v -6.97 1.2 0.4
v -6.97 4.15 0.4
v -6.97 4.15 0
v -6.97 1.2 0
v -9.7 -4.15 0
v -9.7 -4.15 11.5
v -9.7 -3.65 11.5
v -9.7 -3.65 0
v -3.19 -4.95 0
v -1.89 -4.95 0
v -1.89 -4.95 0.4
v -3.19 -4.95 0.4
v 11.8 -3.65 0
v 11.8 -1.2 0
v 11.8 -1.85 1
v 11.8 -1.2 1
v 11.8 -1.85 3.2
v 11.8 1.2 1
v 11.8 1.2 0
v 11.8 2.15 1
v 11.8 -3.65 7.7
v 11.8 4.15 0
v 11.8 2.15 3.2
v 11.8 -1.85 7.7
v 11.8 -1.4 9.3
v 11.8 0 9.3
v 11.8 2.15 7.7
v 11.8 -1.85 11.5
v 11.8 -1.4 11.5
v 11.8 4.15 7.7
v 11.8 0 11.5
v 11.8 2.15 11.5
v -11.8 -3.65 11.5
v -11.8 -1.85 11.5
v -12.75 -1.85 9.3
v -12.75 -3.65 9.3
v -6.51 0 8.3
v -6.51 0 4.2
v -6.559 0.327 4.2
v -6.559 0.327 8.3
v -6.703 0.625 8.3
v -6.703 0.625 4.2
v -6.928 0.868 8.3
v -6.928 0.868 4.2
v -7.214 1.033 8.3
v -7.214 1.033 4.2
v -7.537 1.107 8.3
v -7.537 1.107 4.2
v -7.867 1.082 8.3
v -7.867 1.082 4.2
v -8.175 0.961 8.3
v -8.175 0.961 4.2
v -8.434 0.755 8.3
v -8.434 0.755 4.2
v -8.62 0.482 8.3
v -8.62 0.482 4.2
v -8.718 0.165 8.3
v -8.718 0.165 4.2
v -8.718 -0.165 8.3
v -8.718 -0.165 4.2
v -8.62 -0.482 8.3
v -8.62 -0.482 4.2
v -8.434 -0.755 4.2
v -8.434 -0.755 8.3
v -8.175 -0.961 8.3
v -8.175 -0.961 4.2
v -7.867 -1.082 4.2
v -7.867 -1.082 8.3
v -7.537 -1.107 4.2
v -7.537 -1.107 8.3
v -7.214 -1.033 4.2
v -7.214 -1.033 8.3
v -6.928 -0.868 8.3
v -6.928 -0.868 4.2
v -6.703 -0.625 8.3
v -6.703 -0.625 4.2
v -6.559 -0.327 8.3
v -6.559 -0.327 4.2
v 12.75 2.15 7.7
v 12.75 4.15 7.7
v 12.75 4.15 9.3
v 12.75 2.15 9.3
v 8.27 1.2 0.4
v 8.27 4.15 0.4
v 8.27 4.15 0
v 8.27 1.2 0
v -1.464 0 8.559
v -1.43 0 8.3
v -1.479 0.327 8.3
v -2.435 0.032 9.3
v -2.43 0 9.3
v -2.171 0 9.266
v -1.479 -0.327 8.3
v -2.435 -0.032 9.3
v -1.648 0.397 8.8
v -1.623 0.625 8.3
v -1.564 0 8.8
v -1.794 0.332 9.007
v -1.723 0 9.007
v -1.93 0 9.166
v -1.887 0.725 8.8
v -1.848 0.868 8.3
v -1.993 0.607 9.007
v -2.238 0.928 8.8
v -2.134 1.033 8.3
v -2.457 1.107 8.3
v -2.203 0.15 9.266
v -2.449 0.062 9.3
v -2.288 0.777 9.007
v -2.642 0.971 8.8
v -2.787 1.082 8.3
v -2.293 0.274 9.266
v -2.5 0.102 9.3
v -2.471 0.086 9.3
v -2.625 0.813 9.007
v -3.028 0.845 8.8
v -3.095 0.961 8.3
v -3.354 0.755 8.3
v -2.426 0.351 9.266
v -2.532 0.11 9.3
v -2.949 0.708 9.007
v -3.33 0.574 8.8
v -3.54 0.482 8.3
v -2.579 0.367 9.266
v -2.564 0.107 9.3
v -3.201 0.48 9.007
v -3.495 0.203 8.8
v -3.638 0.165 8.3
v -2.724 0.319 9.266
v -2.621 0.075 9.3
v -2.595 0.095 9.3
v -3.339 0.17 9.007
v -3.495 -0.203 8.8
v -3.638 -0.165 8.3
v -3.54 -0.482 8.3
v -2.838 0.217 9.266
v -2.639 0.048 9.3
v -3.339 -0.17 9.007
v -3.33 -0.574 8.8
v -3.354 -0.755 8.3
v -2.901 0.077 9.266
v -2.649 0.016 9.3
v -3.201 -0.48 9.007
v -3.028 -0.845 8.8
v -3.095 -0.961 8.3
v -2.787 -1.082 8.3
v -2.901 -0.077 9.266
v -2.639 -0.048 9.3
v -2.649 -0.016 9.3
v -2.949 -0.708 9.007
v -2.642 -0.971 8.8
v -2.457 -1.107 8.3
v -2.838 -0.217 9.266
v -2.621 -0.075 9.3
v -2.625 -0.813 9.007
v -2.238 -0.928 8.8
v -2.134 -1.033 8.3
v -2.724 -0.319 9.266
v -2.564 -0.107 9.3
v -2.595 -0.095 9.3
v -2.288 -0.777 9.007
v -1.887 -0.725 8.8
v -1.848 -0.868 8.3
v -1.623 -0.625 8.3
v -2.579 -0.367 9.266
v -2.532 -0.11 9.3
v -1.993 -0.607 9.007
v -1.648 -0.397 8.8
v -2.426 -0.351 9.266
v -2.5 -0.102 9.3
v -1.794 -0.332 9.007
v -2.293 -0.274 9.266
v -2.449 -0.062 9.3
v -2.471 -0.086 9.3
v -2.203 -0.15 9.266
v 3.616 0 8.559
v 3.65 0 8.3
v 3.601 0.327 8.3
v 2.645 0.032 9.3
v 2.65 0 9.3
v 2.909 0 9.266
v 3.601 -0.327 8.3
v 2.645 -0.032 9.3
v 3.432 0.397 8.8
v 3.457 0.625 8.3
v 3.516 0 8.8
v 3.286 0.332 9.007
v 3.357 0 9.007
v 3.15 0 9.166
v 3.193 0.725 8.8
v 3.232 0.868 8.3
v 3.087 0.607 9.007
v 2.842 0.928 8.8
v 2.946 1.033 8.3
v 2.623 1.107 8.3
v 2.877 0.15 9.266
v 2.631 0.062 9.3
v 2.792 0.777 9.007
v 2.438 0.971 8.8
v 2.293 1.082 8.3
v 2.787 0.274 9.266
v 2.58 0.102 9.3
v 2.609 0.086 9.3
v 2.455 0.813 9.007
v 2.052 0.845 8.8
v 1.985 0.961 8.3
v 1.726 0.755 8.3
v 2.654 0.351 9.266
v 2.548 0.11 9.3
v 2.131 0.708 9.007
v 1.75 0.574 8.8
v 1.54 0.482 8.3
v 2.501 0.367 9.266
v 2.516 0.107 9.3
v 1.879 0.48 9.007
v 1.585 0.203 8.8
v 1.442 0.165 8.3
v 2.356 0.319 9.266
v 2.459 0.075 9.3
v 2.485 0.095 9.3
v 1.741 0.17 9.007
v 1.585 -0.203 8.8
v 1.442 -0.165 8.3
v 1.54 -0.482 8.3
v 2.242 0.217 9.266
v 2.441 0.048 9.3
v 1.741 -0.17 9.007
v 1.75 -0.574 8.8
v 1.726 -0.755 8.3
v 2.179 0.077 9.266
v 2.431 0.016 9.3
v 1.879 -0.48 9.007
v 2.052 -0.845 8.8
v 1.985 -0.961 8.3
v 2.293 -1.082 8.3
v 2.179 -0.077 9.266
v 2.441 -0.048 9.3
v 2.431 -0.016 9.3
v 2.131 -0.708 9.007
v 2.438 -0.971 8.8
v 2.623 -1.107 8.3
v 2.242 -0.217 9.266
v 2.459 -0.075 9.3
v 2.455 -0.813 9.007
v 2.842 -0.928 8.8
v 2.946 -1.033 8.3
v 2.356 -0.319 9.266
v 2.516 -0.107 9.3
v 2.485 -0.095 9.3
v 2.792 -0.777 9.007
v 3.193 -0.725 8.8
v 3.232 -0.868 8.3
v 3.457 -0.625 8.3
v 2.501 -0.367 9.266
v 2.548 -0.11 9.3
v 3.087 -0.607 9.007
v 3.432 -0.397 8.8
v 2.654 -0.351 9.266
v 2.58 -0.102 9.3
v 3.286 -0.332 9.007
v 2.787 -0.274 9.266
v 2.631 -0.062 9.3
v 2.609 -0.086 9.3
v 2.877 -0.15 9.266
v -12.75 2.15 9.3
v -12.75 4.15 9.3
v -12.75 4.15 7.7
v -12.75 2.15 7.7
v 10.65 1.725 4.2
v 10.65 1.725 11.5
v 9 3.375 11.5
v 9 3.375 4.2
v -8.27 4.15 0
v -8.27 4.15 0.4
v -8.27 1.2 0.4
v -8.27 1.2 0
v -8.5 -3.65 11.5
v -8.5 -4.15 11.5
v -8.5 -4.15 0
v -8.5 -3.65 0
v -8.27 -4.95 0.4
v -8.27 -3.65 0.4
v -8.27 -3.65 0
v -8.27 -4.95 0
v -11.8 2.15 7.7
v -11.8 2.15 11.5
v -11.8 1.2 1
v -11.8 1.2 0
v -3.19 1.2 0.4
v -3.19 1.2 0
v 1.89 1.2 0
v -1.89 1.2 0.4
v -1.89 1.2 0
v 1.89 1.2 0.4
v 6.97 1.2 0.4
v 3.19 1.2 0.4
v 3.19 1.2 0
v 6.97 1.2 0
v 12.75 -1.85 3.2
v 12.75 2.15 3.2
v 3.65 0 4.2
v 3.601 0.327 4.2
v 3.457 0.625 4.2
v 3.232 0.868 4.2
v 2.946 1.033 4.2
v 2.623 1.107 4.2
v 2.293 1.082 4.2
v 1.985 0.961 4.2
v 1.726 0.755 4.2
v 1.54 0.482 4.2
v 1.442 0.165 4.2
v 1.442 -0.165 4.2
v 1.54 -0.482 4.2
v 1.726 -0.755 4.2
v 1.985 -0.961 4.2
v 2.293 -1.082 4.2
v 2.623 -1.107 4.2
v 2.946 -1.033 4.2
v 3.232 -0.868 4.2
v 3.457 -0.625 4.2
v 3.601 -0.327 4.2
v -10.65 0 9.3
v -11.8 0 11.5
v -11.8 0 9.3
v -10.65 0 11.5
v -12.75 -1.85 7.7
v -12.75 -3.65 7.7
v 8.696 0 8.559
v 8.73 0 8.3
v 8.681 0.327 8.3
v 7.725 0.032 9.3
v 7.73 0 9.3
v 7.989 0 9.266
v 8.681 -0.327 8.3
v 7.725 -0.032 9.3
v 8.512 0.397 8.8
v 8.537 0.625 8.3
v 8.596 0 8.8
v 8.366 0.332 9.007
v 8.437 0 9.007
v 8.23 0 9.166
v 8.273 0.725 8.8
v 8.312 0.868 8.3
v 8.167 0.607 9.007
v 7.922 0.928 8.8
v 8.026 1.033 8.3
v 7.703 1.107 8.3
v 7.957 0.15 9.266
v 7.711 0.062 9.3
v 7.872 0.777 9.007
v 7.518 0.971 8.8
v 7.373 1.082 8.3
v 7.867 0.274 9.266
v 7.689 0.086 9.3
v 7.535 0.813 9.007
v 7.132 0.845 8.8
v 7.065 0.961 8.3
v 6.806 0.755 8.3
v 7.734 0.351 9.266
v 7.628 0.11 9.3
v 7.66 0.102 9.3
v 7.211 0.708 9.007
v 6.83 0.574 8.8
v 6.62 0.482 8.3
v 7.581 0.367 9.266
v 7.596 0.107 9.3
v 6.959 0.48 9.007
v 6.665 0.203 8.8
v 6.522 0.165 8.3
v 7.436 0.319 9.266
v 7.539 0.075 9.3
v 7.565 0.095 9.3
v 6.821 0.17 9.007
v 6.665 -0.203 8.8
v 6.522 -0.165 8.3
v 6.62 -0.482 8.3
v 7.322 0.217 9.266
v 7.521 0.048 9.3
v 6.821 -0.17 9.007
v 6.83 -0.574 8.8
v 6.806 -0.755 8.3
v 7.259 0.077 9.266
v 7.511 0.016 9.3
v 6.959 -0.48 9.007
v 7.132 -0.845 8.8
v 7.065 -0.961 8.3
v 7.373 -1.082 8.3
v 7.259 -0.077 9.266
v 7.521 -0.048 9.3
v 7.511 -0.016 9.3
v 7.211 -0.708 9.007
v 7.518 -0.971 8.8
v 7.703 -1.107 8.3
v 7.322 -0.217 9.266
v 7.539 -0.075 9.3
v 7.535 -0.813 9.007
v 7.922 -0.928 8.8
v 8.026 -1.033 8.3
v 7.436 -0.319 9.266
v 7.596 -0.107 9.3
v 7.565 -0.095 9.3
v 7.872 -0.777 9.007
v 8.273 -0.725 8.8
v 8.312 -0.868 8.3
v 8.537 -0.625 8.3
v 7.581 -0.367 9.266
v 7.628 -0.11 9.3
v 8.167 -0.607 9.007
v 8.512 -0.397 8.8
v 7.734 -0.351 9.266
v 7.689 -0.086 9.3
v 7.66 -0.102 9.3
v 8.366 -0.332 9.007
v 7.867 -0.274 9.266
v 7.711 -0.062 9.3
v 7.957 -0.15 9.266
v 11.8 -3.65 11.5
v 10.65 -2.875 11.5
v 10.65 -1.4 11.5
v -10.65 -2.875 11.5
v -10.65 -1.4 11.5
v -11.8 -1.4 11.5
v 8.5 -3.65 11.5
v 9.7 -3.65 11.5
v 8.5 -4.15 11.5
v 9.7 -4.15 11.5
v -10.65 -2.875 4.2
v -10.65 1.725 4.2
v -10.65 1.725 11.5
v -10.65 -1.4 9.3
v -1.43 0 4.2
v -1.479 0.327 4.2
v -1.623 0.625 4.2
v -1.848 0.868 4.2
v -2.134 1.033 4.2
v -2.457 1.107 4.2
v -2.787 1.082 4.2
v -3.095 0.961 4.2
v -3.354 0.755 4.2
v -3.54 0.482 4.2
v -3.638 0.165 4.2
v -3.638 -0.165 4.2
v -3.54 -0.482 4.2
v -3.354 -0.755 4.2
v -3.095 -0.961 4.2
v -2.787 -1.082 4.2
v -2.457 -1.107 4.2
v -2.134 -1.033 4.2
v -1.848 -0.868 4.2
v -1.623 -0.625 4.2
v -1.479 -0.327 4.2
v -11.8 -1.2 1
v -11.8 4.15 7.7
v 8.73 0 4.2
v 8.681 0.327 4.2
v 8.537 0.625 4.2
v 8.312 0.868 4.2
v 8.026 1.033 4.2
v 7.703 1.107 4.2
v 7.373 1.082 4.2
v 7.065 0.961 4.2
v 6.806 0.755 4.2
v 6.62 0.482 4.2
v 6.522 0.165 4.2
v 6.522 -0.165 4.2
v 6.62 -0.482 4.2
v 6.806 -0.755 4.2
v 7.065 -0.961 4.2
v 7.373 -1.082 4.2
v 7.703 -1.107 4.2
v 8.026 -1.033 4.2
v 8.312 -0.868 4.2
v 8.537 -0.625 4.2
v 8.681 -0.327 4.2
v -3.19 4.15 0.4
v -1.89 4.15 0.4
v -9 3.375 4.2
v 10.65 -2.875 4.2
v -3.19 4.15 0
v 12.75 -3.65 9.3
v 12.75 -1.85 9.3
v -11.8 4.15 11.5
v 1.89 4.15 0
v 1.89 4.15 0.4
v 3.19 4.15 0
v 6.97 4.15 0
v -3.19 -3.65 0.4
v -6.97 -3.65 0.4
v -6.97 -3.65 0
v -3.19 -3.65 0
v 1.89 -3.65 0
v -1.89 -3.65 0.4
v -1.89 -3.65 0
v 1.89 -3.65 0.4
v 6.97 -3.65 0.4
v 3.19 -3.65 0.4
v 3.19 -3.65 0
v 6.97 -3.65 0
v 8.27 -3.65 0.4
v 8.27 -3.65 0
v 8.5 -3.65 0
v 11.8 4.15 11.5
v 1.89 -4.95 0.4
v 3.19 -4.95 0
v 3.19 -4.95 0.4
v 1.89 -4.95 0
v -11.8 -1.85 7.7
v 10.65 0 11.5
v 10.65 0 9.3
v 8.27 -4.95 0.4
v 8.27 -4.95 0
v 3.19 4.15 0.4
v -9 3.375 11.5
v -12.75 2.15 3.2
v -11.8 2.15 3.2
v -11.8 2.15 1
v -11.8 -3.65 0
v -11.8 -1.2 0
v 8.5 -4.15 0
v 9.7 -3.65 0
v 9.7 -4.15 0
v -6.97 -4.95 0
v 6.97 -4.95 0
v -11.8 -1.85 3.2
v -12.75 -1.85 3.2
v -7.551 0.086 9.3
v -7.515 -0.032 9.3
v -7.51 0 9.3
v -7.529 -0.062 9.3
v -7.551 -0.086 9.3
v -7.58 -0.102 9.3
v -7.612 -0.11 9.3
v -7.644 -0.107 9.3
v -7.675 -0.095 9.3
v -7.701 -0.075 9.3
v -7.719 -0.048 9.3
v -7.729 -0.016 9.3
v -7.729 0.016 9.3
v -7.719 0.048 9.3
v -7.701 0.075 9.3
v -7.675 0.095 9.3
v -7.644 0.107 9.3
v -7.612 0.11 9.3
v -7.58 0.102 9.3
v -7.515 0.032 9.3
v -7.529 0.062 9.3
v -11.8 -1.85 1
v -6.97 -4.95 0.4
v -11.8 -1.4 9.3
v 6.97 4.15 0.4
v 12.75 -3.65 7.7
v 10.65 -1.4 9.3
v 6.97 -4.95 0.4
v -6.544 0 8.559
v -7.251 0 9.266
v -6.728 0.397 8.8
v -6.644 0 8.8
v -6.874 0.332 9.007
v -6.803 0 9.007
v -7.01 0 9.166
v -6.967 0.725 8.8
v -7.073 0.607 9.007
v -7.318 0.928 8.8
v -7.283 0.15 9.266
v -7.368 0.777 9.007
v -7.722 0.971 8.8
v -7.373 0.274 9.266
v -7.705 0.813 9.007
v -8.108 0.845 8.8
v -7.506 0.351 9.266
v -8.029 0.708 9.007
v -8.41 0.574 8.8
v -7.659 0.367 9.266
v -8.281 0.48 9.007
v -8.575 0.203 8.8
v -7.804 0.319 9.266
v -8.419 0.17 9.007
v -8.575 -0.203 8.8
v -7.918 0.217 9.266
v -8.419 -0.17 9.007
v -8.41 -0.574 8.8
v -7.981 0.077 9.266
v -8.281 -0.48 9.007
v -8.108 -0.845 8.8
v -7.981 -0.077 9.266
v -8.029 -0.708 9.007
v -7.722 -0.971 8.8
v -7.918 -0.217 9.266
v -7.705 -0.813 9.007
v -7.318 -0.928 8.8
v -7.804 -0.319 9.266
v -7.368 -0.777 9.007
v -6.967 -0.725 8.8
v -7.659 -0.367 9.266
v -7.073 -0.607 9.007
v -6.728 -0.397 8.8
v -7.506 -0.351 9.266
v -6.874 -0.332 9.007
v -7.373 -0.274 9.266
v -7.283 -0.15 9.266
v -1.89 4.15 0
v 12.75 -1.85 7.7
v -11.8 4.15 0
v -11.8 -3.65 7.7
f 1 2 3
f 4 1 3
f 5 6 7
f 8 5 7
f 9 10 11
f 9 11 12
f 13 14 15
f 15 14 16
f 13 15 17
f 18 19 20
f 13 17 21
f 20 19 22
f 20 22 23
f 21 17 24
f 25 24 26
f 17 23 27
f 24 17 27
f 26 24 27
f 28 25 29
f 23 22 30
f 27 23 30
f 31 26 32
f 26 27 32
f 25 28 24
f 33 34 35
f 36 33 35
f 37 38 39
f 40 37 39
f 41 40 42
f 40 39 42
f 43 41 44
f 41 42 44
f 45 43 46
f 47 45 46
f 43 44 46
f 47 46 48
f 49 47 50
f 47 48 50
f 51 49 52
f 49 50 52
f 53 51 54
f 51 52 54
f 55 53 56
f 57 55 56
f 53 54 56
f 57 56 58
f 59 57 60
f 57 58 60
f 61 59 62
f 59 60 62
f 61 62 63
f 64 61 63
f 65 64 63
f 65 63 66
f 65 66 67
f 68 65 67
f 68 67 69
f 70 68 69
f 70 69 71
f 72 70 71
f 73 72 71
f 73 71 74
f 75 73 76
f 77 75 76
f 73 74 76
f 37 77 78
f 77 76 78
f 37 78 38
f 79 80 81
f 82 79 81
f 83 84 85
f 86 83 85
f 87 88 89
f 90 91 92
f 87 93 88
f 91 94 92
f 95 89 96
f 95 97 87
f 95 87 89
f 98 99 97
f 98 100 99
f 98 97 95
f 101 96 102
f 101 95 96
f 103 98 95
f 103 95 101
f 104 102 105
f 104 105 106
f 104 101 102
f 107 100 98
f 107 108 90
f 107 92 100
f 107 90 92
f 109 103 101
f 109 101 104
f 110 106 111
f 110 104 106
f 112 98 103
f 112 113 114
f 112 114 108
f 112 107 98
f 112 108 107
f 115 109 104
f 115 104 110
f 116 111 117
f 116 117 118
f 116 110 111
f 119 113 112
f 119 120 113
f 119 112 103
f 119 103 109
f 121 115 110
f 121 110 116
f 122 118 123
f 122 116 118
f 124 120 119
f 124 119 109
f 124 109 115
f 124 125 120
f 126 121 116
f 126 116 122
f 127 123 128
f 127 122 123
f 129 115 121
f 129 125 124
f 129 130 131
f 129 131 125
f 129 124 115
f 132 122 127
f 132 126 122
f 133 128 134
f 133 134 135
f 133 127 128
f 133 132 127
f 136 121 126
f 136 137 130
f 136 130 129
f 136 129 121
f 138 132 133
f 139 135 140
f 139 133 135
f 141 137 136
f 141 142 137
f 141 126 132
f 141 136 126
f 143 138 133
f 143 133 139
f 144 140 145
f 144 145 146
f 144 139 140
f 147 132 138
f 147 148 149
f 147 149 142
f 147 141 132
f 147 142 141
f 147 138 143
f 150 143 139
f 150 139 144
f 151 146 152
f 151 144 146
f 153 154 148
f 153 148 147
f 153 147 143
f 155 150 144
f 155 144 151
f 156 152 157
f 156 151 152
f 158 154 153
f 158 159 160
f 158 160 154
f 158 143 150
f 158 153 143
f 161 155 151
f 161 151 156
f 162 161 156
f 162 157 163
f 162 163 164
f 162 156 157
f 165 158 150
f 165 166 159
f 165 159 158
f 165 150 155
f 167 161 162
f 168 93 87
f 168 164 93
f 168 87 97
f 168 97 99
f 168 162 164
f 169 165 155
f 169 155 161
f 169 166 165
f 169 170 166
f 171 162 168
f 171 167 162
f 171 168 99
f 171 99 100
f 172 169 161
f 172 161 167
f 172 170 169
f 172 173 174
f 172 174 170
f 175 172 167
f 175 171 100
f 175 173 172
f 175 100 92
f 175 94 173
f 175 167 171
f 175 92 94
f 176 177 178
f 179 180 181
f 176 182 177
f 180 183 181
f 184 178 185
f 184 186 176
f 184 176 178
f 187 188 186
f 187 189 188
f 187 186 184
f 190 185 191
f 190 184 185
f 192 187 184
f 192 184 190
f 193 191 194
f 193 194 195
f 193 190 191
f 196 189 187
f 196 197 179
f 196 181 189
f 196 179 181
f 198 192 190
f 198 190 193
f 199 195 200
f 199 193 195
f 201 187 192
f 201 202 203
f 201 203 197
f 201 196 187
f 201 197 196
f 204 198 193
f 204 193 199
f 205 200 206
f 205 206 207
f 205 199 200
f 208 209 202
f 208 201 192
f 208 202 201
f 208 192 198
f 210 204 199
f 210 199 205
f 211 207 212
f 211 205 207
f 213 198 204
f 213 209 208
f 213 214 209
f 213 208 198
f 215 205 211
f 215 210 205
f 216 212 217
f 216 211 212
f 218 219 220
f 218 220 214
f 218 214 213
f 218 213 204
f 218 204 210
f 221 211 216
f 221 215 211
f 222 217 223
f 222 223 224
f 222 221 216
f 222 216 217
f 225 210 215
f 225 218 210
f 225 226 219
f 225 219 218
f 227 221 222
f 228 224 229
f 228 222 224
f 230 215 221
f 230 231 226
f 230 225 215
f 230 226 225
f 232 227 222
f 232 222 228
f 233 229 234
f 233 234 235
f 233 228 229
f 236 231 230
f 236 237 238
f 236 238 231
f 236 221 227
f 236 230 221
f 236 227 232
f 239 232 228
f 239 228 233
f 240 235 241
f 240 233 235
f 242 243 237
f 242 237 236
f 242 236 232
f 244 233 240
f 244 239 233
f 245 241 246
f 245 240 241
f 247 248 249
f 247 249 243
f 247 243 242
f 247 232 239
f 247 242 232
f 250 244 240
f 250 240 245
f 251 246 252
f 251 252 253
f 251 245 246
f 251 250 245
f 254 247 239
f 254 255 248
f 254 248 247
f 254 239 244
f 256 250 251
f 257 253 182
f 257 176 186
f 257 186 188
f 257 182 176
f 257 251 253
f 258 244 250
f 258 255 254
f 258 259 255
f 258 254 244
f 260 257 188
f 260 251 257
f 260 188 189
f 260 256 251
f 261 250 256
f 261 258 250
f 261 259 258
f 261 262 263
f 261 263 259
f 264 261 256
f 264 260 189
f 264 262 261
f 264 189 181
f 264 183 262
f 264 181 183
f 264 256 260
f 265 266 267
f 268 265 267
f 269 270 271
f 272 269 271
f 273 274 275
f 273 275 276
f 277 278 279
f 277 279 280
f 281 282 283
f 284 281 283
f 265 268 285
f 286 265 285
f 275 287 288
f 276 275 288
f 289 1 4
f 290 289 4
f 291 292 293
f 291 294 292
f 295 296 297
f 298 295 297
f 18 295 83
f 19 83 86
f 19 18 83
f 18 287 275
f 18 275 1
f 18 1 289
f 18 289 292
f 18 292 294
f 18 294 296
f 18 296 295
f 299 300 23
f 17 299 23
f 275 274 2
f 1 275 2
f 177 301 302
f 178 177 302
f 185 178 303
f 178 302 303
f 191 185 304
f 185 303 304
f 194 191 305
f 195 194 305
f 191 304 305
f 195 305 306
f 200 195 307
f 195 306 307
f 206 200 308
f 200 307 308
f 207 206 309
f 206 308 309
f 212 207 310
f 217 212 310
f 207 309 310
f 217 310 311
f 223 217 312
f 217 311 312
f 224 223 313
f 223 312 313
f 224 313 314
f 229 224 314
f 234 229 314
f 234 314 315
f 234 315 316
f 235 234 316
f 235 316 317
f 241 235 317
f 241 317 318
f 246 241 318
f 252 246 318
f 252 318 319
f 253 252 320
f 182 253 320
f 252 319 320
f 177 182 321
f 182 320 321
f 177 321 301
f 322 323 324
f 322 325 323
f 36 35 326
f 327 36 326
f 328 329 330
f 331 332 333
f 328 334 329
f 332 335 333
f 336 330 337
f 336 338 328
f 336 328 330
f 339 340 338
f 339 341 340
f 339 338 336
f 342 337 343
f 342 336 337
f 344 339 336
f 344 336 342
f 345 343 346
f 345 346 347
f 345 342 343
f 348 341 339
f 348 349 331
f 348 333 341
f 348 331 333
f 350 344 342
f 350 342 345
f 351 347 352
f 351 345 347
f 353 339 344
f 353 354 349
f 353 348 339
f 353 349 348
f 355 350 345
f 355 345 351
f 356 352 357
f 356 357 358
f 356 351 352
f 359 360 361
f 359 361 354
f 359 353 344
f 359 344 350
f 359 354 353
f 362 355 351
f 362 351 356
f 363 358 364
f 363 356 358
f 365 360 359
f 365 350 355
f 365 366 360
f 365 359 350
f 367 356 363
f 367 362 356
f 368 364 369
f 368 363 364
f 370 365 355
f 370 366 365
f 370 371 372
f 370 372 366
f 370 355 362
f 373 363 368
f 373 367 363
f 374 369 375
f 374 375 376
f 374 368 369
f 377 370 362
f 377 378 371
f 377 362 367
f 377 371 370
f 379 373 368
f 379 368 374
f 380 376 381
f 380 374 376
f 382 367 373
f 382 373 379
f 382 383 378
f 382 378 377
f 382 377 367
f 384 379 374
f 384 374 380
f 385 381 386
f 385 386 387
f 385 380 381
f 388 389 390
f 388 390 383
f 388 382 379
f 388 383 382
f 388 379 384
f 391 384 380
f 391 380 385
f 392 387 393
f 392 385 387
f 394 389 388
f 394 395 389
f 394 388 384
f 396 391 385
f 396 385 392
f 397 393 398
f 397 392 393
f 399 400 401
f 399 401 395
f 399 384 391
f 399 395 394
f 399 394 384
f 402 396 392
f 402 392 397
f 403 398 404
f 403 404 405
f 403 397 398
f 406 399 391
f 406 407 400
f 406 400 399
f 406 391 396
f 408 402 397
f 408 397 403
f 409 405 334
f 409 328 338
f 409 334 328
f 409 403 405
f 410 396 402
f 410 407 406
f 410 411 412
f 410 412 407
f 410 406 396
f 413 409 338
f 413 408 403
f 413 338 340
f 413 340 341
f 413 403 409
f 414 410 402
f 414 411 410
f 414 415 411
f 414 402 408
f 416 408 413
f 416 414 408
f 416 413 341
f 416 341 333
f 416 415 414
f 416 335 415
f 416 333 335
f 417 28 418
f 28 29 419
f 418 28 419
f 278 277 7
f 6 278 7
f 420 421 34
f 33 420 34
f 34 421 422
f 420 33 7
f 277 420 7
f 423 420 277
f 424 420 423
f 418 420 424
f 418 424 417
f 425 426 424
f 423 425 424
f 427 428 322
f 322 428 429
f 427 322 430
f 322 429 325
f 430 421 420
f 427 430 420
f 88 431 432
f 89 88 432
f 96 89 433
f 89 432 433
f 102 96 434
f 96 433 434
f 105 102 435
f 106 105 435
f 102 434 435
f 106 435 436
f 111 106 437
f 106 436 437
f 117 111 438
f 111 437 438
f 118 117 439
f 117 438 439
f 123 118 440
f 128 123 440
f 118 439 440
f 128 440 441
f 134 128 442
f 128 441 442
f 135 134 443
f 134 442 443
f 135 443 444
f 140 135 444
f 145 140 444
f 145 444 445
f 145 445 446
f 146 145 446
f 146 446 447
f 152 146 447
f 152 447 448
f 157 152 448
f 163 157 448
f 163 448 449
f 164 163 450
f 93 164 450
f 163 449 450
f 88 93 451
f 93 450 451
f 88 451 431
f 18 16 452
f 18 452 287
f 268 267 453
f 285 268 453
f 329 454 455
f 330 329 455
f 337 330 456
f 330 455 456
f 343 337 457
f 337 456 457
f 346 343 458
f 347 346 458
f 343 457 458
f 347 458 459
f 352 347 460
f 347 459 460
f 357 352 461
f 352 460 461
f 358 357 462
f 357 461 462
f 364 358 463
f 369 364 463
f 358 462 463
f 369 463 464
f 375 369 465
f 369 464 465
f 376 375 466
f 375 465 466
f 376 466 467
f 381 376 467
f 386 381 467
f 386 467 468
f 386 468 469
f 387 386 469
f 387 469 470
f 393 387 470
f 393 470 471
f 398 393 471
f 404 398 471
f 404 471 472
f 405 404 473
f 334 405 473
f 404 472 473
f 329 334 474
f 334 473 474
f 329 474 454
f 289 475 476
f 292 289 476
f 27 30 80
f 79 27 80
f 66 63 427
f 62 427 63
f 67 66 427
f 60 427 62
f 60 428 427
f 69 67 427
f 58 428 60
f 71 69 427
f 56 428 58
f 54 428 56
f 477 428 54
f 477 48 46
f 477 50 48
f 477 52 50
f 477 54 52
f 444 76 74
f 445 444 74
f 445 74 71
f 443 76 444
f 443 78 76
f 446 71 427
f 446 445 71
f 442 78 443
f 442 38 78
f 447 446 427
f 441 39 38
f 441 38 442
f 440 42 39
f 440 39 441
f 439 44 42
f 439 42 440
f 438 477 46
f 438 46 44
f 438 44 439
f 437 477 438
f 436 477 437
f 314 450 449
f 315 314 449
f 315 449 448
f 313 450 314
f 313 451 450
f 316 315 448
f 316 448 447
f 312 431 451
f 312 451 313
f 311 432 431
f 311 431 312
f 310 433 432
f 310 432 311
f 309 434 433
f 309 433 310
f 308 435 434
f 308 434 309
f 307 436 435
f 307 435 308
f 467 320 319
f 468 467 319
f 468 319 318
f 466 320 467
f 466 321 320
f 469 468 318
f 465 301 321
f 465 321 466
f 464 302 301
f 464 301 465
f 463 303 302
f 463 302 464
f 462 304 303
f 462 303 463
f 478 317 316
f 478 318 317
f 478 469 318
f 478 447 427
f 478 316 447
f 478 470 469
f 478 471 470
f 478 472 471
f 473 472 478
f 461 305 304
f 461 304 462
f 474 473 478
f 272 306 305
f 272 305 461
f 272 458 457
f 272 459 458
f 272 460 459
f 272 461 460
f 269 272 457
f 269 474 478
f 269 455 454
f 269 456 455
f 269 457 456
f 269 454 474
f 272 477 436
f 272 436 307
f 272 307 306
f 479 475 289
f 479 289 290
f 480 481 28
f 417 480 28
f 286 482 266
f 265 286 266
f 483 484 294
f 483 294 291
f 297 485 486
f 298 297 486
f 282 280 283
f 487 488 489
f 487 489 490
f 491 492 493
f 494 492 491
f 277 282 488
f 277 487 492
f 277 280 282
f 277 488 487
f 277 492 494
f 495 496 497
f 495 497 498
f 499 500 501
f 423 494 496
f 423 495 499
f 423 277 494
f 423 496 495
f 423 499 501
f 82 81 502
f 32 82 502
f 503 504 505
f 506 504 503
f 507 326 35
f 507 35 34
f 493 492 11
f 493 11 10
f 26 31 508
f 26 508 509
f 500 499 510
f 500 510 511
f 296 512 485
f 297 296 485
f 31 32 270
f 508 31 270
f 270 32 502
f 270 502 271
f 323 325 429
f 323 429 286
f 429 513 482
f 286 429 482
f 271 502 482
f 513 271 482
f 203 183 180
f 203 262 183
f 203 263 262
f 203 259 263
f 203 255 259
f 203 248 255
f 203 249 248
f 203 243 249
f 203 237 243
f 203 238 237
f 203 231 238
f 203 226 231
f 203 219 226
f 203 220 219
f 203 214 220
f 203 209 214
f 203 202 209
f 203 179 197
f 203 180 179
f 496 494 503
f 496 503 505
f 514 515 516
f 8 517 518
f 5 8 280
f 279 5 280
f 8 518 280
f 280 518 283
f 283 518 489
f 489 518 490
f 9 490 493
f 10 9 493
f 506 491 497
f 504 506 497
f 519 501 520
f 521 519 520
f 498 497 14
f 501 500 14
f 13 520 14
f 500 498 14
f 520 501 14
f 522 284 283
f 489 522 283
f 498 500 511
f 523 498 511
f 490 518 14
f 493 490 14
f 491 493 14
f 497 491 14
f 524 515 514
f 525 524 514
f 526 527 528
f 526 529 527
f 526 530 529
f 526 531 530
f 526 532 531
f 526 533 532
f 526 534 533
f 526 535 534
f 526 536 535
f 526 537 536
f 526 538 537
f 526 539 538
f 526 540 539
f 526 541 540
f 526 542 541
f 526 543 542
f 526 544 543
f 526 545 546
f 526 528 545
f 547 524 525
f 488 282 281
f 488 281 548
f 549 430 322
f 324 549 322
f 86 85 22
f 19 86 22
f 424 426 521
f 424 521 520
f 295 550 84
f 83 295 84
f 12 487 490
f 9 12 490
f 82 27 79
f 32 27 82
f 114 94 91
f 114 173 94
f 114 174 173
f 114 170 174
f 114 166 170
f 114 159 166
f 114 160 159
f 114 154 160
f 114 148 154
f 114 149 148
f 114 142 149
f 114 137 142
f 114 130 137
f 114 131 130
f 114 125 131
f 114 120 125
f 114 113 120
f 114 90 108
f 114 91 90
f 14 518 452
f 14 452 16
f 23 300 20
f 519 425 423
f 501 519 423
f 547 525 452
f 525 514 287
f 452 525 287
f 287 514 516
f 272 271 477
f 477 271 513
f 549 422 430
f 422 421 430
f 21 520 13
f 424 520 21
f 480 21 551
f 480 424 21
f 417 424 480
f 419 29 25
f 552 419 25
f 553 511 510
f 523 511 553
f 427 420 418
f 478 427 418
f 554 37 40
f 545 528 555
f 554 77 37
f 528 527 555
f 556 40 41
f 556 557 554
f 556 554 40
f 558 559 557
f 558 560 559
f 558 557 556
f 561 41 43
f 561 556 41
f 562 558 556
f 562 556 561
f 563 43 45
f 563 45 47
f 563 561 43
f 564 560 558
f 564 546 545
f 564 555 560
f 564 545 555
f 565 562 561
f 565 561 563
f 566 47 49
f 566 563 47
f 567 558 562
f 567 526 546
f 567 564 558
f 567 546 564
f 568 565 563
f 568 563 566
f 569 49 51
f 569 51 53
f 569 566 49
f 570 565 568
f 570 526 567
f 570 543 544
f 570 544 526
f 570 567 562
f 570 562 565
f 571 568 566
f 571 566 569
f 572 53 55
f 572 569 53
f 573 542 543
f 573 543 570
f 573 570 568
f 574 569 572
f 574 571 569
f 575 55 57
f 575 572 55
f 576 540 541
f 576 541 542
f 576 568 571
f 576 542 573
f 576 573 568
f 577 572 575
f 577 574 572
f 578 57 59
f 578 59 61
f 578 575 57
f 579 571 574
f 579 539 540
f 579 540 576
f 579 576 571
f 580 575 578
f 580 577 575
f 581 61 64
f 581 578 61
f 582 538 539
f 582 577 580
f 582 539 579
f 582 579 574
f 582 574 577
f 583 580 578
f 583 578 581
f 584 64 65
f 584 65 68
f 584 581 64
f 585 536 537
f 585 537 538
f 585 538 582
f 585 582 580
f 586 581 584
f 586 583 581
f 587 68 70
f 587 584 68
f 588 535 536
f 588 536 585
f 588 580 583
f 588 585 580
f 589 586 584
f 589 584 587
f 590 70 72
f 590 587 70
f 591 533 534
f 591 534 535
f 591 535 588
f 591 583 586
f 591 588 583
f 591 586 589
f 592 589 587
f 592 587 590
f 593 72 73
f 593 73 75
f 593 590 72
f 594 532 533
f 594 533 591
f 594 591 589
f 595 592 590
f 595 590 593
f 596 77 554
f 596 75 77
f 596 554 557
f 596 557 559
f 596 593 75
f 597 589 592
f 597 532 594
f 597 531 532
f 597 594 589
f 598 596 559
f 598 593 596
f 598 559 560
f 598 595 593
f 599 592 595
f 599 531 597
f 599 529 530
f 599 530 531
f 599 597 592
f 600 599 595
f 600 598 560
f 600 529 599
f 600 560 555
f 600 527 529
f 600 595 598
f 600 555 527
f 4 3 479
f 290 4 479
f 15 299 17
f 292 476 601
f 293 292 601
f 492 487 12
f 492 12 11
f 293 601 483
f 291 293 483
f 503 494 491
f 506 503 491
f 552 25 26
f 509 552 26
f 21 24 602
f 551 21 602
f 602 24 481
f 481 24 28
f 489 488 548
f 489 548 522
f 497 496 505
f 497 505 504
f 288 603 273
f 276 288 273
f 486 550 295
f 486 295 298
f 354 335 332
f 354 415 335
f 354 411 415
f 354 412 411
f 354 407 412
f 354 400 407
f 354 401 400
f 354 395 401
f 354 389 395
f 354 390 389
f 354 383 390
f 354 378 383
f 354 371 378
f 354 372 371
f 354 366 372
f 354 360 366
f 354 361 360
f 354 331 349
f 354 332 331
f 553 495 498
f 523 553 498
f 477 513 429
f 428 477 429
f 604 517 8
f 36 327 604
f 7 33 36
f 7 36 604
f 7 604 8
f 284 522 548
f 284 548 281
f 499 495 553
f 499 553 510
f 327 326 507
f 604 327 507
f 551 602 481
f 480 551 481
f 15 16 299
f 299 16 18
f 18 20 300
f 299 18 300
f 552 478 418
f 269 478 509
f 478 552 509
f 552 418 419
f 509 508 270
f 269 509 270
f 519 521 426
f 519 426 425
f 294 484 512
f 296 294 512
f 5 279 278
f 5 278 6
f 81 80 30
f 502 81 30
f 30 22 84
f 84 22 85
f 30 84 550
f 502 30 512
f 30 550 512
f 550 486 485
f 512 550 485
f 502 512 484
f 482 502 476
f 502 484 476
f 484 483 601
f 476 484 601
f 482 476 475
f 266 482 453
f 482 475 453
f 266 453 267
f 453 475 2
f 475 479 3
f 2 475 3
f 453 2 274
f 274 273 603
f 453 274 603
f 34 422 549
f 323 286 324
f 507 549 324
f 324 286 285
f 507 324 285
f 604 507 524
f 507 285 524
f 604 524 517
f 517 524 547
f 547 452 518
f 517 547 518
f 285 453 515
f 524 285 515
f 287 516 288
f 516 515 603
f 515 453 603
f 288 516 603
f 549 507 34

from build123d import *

# Parameters (mm, degrees)
BOSS_EXTRUDE1_DEPTH = 4.15
SKETCH2_W           = 10
SKETCH2_H           = 5
SKETCH2_W_2         = 17
CUT_EXTRUDE1_DEPTH  = 12.5
SKETCH3_W           = 5
SKETCH3_H           = 4
CUT_EXTRUDE2_DEPTH  = 6.3
SKETCH4_W           = 5
SKETCH4_H           = 4.540427611
SKETCH4_H_2         = 5
CUT_EXTRUDE3_DEPTH  = 6.3
CUT_EXTRUDE4_DEPTH  = 7.3
SKETCH6_R           = 1.11
BOSS_EXTRUDE2_DEPTH = 5.1
FILLET1_R           = 1
SKETCH7_W           = 5
SKETCH7_H           = 1.4
CUT_EXTRUDE5_DEPTH  = 25.55
SKETCH8_W           = 1.3
SKETCH8_H           = 3
CUT_EXTRUDE6_DEPTH  = 9.3
SKETCH9_W           = 3
SKETCH9_H           = 2.4
CUT_EXTRUDE7_DEPTH  = 25.55
SKETCH10_W          = 1.3
SKETCH10_H          = 0.4
BOSS_EXTRUDE3_DEPTH = 6.5
SKETCH11_W          = 20
SKETCH11_H          = 5
CUT_EXTRUDE8_DEPTH  = 12.5


with BuildPart() as part:
    # Sketch1 → Boss-Extrude1 (new body, symmetric)
    with BuildSketch(Plane(origin=(0, 0, 0), x_dir=(1, 0, 0), z_dir=(0, 1, 0))):
        Polygon((-11.8, 0), (11.8, 0), (11.8, -1), (12.75, -3.2), (11.8, -3.2), (11.8, -7.7), (12.75, -7.7), (12.75, -9.3), (11.8, -11.5), (-11.8, -11.5), (-12.75, -9.3), (-12.75, -7.7), (-11.8, -7.7), (-11.8, -3.2), (-12.75, -3.2), (-11.8, -1), align=None)
    extrude(amount=BOSS_EXTRUDE1_DEPTH, both=True)

    # Sketch2 → Cut-Extrude1 (cut, through all)
    with BuildSketch(Plane.XY.offset(11.5)):
        with Locations((14.7, -6.15)):
            Rectangle(SKETCH2_W, SKETCH2_H)
        with Locations((-14.7, -6.15)):
            Rectangle(SKETCH2_W, SKETCH2_H)
        with Locations((0, -6.15)):
            Rectangle(SKETCH2_W_2, SKETCH2_H)
    extrude(amount=-CUT_EXTRUDE1_DEPTH, mode=Mode.SUBTRACT)

    # Sketch3 → Cut-Extrude2 (cut)
    with BuildSketch(Plane.XY.offset(11.5)):
        with Locations((14.3, 0.15)):
            Rectangle(SKETCH3_W, SKETCH3_H)
        with Locations((-14.3, 0.15)):
            Rectangle(SKETCH3_W, SKETCH3_H)
    extrude(amount=-CUT_EXTRUDE2_DEPTH, mode=Mode.SUBTRACT)

    # Sketch4 → Cut-Extrude3 (cut)
    with BuildSketch(Plane(origin=(0, 0, 0), x_dir=(-1, 0, 0), z_dir=(0, 0, -1))):
        with Locations((14.3, 4.420213806)):
            Rectangle(SKETCH4_W, SKETCH4_H)
        with Locations((14.3, -4.35)):
            Rectangle(SKETCH4_W, SKETCH4_H_2)
        with Locations((-14.3, -4.35)):
            Rectangle(SKETCH4_W, SKETCH4_H_2)
        with Locations((-14.3, 4.65)):
            Rectangle(SKETCH4_W, SKETCH4_H_2)
    extrude(amount=-CUT_EXTRUDE3_DEPTH, mode=Mode.SUBTRACT)

    # Sketch5 → Cut-Extrude4 (cut)
    with BuildSketch(Plane.XY.offset(11.5)):
        Polygon((-10.65, -2.875), (10.65, -2.875), (10.65, 1.725), (9, 3.375), (-9, 3.375), (-10.65, 1.725), align=None)
    extrude(amount=-CUT_EXTRUDE4_DEPTH, mode=Mode.SUBTRACT)

    # Sketch6 → Boss-Extrude2 (add)
    with BuildSketch(Plane.XY.offset(4.2)):
        with Locations((-7.62, 0)):
            Circle(SKETCH6_R)
        with Locations((-2.54, 0)):
            Circle(SKETCH6_R)
        with Locations((2.54, -3.41e-07)):
            Circle(SKETCH6_R)
        with Locations((7.62, 0)):
            Circle(SKETCH6_R)
    extrude(amount=BOSS_EXTRUDE2_DEPTH)

    # Fillet1
    fillet1_edges = [part.edges().sort_by_distance(p)[0] for p in [
        (-8.73, 0, 9.3),
        (-3.65, 0, 9.3),
        (1.43, -3.41e-07, 9.3),
        (6.51, 0, 9.3),
    ]]
    fillet(fillet1_edges, radius=FILLET1_R)

    # Sketch7 → Cut-Extrude5 (cut, through all)
    with BuildSketch(Plane(origin=(11.8, 0, 0), x_dir=(0, 0, -1), z_dir=(1, 0, 0))):
        with Locations((-11.8, -0.7)):
            Rectangle(SKETCH7_W, SKETCH7_H)
    extrude(amount=-CUT_EXTRUDE5_DEPTH, mode=Mode.SUBTRACT)

    # Sketch8 → Cut-Extrude6 (cut, through all)
    with BuildSketch(Plane(origin=(0, 4.15, 0), x_dir=(1, 0, 0), z_dir=(0, 1, 0))):
        with Locations((-7.62, 1.1)):
            Rectangle(SKETCH8_W, SKETCH8_H)
        with Locations((-2.54, 1.1)):
            Rectangle(SKETCH8_W, SKETCH8_H)
        with Locations((2.54, 1.1)):
            Rectangle(SKETCH8_W, SKETCH8_H)
        with Locations((7.62, 1.1)):
            Rectangle(SKETCH8_W, SKETCH8_H)
    extrude(amount=-CUT_EXTRUDE6_DEPTH, mode=Mode.SUBTRACT)

    # Sketch9 → Cut-Extrude7 (cut, through all)
    with BuildSketch(Plane(origin=(11.8, 0, 0), x_dir=(0, 0, -1), z_dir=(1, 0, 0))):
        with Locations((0.5, 0)):
            Rectangle(SKETCH9_W, SKETCH9_H)
    extrude(amount=-CUT_EXTRUDE7_DEPTH, mode=Mode.SUBTRACT)

    # Sketch10 → Boss-Extrude3 (add)
    with BuildSketch(Plane(origin=(0, -1.2, 0), x_dir=(1, 0, 0), z_dir=(0, 1, 0))):
        with Locations((-7.62, -0.2)):
            Rectangle(SKETCH10_W, SKETCH10_H)
        with Locations((-2.54, -0.2)):
            Rectangle(SKETCH10_W, SKETCH10_H)
        with Locations((2.54, -0.2)):
            Rectangle(SKETCH10_W, SKETCH10_H)
        with Locations((7.62, -0.2)):
            Rectangle(SKETCH10_W, SKETCH10_H)
    extrude(amount=-BOSS_EXTRUDE3_DEPTH)

    # Sketch11 → Cut-Extrude8 (cut, through all)
    with BuildSketch(Plane(origin=(0, 0, 0), x_dir=(-1, 0, 0), z_dir=(0, 0, -1))):
        with Locations((0, -7.45)):
            Rectangle(SKETCH11_W, SKETCH11_H)
    extrude(amount=-CUT_EXTRUDE8_DEPTH, mode=Mode.SUBTRACT)


solid = part.part
